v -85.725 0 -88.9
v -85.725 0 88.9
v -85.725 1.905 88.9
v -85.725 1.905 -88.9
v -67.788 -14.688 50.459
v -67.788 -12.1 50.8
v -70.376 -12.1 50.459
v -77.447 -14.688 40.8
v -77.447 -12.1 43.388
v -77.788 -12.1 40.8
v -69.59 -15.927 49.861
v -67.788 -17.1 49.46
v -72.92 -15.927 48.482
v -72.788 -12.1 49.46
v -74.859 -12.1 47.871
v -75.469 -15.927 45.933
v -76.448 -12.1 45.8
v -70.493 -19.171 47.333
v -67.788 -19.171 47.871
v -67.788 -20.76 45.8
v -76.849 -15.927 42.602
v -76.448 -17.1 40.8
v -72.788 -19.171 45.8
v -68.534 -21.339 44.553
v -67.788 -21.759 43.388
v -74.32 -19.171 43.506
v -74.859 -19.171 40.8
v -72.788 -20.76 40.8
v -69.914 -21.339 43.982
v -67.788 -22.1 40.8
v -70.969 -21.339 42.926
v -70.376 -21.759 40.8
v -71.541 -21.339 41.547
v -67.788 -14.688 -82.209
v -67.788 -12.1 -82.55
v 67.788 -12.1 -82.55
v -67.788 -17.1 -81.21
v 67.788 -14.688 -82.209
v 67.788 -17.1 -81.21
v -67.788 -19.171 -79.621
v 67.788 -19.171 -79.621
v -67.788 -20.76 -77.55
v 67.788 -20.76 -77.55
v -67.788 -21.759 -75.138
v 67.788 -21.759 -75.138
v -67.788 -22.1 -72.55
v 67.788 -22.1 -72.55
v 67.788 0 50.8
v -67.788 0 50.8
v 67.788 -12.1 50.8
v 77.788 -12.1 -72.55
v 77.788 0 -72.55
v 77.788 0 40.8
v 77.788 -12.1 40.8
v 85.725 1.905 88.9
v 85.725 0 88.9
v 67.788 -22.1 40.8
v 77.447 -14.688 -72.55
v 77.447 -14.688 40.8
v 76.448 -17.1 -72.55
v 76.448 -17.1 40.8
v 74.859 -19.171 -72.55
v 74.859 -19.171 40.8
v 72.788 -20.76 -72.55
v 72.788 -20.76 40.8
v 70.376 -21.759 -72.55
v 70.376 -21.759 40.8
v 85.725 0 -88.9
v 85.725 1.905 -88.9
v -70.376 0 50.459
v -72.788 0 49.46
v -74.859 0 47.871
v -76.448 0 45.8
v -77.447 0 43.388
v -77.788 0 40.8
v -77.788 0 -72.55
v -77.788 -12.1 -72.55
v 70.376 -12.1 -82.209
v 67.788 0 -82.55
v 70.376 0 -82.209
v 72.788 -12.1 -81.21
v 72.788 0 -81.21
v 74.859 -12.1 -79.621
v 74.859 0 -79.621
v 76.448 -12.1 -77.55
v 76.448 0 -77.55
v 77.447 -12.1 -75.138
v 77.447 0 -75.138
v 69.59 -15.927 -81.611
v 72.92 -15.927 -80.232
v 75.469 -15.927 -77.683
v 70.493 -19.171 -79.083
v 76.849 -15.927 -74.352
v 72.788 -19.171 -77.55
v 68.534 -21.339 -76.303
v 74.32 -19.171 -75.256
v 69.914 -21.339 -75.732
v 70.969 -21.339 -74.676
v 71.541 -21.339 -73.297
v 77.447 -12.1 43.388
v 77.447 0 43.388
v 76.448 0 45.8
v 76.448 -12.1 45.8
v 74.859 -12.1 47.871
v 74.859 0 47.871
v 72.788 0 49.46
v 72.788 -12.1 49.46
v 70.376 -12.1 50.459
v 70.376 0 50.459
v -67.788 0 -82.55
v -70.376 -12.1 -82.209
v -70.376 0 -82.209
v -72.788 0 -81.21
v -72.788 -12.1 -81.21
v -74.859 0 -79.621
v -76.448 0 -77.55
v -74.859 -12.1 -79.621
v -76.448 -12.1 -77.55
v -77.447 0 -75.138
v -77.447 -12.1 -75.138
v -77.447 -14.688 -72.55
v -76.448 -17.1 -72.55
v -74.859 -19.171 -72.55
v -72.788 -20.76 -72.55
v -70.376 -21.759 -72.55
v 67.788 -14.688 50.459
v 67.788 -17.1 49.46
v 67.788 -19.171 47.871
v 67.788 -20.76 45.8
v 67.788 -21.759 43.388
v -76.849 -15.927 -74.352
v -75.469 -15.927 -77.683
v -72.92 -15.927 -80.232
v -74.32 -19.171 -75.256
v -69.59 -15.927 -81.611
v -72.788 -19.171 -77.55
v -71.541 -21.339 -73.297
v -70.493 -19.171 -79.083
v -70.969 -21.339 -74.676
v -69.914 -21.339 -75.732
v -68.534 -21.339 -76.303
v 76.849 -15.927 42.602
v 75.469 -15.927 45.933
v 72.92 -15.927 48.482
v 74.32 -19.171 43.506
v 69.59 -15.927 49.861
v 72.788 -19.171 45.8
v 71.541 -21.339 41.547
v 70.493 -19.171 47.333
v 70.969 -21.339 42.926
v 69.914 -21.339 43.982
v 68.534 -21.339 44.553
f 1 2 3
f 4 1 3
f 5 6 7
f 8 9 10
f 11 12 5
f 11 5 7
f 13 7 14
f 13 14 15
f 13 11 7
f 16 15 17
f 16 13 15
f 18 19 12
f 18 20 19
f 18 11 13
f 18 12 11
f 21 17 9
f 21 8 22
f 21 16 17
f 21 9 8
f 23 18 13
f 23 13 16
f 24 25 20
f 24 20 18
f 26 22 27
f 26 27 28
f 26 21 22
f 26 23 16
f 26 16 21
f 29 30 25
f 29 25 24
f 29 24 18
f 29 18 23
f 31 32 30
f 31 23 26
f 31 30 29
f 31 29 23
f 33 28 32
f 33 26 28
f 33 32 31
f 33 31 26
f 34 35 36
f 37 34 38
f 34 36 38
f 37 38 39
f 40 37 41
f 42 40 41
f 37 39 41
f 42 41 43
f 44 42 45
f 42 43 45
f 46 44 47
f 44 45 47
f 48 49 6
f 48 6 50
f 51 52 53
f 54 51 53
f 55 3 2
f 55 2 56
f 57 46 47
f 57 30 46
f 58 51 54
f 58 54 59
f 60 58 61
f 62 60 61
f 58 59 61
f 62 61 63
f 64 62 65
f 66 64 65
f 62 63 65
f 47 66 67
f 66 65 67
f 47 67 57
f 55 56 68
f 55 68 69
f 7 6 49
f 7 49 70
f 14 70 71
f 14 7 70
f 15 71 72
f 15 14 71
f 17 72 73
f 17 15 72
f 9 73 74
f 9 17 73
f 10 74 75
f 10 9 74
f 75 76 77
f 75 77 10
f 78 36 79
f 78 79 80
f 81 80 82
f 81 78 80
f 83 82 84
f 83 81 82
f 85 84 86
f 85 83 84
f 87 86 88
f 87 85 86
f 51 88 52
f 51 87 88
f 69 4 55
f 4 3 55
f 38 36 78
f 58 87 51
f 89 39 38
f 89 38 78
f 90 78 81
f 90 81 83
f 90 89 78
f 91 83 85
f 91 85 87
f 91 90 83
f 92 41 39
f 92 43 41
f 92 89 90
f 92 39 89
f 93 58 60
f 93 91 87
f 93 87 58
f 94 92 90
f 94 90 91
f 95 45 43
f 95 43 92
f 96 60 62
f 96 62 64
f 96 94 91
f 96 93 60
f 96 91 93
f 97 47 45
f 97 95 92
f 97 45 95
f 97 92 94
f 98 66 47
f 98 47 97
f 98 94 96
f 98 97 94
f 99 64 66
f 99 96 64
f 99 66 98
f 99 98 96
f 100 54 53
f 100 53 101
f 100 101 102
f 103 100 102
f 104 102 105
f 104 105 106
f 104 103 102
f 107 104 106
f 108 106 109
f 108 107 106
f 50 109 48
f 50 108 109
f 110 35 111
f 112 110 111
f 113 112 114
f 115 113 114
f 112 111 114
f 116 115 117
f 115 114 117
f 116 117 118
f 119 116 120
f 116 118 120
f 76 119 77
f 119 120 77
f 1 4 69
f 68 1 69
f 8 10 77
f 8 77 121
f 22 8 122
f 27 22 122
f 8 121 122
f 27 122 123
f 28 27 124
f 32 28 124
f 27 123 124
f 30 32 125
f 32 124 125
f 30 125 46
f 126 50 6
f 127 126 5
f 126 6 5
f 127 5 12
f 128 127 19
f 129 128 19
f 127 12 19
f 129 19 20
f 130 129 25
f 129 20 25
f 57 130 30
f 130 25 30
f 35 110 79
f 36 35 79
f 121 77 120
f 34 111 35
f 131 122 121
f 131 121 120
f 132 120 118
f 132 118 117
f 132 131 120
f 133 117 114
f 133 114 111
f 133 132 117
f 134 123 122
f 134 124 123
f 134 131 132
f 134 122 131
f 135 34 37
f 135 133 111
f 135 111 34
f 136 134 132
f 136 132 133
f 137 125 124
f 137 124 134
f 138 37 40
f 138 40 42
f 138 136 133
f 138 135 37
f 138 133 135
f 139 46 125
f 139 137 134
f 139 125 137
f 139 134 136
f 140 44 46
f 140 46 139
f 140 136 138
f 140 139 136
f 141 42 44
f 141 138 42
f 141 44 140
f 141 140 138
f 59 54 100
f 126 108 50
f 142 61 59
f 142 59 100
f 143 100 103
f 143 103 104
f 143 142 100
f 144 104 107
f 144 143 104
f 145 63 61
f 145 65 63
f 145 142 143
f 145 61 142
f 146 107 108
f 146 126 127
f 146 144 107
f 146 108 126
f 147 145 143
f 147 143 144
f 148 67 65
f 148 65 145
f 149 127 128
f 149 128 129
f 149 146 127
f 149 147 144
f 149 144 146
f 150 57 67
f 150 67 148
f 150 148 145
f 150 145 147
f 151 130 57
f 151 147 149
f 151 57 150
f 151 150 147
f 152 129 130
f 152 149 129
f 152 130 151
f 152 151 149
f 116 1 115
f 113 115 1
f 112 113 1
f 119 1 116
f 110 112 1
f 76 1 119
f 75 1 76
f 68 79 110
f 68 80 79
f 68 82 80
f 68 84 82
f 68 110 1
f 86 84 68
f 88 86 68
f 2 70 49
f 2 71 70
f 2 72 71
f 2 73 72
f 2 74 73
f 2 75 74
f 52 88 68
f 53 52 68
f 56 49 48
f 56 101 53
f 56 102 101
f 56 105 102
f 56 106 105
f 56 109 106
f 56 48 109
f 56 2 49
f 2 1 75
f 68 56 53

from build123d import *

# Parameters (mm, degrees)
SKETCH1_W      = 171.45
SKETCH1_H      = 1.905
EXTRUDE1_DEPTH = 88.9
SKETCH2_W      = 155.575
SKETCH2_H      = 133.35
EXTRUDE2_DEPTH = 22.1
FILLET1_R      = 10
FILLET2_R      = 10


with BuildPart() as part:
    # Sketch1 → Extrude1 (new body, symmetric)
    with BuildSketch(Plane.XY):
        with Locations((0, 0.9525)):
            Rectangle(SKETCH1_W, SKETCH1_H)
    extrude(amount=EXTRUDE1_DEPTH, both=True)

    # Sketch2 → Extrude2 (add)
    with BuildSketch(Plane.XZ):
        with Locations((0, -15.875)):
            Rectangle(SKETCH2_W, SKETCH2_H)
    extrude(amount=EXTRUDE2_DEPTH)

    # Fillet1
    fillet1_edges = [part.edges().sort_by_distance(p)[0] for p in [
        (-77.7875, -11.05, 50.8),
        (-77.7875, -11.05, -82.55),
        (77.7875, -11.05, -82.55),
        (77.7875, -11.05, 50.8),
    ]]
    fillet(fillet1_edges, radius=FILLET1_R)

    # Fillet2
    fillet2_edges = [part.edges().sort_by_distance(p)[0] for p in [
        (0, -22.1, -82.55),
        (-77.7875, -22.1, -15.875),
        (77.7875, -22.1, -15.875),
        (0, -22.1, 50.8),
        (-74.858567812, -22.1, 47.871067812),
        (74.858567812, -22.1, 47.871067812),
        (74.858567812, -22.1, -79.621067812),
        (-74.858567812, -22.1, -79.621067812),
    ]]
    fillet(fillet2_edges, radius=FILLET2_R)


solid = part.part
